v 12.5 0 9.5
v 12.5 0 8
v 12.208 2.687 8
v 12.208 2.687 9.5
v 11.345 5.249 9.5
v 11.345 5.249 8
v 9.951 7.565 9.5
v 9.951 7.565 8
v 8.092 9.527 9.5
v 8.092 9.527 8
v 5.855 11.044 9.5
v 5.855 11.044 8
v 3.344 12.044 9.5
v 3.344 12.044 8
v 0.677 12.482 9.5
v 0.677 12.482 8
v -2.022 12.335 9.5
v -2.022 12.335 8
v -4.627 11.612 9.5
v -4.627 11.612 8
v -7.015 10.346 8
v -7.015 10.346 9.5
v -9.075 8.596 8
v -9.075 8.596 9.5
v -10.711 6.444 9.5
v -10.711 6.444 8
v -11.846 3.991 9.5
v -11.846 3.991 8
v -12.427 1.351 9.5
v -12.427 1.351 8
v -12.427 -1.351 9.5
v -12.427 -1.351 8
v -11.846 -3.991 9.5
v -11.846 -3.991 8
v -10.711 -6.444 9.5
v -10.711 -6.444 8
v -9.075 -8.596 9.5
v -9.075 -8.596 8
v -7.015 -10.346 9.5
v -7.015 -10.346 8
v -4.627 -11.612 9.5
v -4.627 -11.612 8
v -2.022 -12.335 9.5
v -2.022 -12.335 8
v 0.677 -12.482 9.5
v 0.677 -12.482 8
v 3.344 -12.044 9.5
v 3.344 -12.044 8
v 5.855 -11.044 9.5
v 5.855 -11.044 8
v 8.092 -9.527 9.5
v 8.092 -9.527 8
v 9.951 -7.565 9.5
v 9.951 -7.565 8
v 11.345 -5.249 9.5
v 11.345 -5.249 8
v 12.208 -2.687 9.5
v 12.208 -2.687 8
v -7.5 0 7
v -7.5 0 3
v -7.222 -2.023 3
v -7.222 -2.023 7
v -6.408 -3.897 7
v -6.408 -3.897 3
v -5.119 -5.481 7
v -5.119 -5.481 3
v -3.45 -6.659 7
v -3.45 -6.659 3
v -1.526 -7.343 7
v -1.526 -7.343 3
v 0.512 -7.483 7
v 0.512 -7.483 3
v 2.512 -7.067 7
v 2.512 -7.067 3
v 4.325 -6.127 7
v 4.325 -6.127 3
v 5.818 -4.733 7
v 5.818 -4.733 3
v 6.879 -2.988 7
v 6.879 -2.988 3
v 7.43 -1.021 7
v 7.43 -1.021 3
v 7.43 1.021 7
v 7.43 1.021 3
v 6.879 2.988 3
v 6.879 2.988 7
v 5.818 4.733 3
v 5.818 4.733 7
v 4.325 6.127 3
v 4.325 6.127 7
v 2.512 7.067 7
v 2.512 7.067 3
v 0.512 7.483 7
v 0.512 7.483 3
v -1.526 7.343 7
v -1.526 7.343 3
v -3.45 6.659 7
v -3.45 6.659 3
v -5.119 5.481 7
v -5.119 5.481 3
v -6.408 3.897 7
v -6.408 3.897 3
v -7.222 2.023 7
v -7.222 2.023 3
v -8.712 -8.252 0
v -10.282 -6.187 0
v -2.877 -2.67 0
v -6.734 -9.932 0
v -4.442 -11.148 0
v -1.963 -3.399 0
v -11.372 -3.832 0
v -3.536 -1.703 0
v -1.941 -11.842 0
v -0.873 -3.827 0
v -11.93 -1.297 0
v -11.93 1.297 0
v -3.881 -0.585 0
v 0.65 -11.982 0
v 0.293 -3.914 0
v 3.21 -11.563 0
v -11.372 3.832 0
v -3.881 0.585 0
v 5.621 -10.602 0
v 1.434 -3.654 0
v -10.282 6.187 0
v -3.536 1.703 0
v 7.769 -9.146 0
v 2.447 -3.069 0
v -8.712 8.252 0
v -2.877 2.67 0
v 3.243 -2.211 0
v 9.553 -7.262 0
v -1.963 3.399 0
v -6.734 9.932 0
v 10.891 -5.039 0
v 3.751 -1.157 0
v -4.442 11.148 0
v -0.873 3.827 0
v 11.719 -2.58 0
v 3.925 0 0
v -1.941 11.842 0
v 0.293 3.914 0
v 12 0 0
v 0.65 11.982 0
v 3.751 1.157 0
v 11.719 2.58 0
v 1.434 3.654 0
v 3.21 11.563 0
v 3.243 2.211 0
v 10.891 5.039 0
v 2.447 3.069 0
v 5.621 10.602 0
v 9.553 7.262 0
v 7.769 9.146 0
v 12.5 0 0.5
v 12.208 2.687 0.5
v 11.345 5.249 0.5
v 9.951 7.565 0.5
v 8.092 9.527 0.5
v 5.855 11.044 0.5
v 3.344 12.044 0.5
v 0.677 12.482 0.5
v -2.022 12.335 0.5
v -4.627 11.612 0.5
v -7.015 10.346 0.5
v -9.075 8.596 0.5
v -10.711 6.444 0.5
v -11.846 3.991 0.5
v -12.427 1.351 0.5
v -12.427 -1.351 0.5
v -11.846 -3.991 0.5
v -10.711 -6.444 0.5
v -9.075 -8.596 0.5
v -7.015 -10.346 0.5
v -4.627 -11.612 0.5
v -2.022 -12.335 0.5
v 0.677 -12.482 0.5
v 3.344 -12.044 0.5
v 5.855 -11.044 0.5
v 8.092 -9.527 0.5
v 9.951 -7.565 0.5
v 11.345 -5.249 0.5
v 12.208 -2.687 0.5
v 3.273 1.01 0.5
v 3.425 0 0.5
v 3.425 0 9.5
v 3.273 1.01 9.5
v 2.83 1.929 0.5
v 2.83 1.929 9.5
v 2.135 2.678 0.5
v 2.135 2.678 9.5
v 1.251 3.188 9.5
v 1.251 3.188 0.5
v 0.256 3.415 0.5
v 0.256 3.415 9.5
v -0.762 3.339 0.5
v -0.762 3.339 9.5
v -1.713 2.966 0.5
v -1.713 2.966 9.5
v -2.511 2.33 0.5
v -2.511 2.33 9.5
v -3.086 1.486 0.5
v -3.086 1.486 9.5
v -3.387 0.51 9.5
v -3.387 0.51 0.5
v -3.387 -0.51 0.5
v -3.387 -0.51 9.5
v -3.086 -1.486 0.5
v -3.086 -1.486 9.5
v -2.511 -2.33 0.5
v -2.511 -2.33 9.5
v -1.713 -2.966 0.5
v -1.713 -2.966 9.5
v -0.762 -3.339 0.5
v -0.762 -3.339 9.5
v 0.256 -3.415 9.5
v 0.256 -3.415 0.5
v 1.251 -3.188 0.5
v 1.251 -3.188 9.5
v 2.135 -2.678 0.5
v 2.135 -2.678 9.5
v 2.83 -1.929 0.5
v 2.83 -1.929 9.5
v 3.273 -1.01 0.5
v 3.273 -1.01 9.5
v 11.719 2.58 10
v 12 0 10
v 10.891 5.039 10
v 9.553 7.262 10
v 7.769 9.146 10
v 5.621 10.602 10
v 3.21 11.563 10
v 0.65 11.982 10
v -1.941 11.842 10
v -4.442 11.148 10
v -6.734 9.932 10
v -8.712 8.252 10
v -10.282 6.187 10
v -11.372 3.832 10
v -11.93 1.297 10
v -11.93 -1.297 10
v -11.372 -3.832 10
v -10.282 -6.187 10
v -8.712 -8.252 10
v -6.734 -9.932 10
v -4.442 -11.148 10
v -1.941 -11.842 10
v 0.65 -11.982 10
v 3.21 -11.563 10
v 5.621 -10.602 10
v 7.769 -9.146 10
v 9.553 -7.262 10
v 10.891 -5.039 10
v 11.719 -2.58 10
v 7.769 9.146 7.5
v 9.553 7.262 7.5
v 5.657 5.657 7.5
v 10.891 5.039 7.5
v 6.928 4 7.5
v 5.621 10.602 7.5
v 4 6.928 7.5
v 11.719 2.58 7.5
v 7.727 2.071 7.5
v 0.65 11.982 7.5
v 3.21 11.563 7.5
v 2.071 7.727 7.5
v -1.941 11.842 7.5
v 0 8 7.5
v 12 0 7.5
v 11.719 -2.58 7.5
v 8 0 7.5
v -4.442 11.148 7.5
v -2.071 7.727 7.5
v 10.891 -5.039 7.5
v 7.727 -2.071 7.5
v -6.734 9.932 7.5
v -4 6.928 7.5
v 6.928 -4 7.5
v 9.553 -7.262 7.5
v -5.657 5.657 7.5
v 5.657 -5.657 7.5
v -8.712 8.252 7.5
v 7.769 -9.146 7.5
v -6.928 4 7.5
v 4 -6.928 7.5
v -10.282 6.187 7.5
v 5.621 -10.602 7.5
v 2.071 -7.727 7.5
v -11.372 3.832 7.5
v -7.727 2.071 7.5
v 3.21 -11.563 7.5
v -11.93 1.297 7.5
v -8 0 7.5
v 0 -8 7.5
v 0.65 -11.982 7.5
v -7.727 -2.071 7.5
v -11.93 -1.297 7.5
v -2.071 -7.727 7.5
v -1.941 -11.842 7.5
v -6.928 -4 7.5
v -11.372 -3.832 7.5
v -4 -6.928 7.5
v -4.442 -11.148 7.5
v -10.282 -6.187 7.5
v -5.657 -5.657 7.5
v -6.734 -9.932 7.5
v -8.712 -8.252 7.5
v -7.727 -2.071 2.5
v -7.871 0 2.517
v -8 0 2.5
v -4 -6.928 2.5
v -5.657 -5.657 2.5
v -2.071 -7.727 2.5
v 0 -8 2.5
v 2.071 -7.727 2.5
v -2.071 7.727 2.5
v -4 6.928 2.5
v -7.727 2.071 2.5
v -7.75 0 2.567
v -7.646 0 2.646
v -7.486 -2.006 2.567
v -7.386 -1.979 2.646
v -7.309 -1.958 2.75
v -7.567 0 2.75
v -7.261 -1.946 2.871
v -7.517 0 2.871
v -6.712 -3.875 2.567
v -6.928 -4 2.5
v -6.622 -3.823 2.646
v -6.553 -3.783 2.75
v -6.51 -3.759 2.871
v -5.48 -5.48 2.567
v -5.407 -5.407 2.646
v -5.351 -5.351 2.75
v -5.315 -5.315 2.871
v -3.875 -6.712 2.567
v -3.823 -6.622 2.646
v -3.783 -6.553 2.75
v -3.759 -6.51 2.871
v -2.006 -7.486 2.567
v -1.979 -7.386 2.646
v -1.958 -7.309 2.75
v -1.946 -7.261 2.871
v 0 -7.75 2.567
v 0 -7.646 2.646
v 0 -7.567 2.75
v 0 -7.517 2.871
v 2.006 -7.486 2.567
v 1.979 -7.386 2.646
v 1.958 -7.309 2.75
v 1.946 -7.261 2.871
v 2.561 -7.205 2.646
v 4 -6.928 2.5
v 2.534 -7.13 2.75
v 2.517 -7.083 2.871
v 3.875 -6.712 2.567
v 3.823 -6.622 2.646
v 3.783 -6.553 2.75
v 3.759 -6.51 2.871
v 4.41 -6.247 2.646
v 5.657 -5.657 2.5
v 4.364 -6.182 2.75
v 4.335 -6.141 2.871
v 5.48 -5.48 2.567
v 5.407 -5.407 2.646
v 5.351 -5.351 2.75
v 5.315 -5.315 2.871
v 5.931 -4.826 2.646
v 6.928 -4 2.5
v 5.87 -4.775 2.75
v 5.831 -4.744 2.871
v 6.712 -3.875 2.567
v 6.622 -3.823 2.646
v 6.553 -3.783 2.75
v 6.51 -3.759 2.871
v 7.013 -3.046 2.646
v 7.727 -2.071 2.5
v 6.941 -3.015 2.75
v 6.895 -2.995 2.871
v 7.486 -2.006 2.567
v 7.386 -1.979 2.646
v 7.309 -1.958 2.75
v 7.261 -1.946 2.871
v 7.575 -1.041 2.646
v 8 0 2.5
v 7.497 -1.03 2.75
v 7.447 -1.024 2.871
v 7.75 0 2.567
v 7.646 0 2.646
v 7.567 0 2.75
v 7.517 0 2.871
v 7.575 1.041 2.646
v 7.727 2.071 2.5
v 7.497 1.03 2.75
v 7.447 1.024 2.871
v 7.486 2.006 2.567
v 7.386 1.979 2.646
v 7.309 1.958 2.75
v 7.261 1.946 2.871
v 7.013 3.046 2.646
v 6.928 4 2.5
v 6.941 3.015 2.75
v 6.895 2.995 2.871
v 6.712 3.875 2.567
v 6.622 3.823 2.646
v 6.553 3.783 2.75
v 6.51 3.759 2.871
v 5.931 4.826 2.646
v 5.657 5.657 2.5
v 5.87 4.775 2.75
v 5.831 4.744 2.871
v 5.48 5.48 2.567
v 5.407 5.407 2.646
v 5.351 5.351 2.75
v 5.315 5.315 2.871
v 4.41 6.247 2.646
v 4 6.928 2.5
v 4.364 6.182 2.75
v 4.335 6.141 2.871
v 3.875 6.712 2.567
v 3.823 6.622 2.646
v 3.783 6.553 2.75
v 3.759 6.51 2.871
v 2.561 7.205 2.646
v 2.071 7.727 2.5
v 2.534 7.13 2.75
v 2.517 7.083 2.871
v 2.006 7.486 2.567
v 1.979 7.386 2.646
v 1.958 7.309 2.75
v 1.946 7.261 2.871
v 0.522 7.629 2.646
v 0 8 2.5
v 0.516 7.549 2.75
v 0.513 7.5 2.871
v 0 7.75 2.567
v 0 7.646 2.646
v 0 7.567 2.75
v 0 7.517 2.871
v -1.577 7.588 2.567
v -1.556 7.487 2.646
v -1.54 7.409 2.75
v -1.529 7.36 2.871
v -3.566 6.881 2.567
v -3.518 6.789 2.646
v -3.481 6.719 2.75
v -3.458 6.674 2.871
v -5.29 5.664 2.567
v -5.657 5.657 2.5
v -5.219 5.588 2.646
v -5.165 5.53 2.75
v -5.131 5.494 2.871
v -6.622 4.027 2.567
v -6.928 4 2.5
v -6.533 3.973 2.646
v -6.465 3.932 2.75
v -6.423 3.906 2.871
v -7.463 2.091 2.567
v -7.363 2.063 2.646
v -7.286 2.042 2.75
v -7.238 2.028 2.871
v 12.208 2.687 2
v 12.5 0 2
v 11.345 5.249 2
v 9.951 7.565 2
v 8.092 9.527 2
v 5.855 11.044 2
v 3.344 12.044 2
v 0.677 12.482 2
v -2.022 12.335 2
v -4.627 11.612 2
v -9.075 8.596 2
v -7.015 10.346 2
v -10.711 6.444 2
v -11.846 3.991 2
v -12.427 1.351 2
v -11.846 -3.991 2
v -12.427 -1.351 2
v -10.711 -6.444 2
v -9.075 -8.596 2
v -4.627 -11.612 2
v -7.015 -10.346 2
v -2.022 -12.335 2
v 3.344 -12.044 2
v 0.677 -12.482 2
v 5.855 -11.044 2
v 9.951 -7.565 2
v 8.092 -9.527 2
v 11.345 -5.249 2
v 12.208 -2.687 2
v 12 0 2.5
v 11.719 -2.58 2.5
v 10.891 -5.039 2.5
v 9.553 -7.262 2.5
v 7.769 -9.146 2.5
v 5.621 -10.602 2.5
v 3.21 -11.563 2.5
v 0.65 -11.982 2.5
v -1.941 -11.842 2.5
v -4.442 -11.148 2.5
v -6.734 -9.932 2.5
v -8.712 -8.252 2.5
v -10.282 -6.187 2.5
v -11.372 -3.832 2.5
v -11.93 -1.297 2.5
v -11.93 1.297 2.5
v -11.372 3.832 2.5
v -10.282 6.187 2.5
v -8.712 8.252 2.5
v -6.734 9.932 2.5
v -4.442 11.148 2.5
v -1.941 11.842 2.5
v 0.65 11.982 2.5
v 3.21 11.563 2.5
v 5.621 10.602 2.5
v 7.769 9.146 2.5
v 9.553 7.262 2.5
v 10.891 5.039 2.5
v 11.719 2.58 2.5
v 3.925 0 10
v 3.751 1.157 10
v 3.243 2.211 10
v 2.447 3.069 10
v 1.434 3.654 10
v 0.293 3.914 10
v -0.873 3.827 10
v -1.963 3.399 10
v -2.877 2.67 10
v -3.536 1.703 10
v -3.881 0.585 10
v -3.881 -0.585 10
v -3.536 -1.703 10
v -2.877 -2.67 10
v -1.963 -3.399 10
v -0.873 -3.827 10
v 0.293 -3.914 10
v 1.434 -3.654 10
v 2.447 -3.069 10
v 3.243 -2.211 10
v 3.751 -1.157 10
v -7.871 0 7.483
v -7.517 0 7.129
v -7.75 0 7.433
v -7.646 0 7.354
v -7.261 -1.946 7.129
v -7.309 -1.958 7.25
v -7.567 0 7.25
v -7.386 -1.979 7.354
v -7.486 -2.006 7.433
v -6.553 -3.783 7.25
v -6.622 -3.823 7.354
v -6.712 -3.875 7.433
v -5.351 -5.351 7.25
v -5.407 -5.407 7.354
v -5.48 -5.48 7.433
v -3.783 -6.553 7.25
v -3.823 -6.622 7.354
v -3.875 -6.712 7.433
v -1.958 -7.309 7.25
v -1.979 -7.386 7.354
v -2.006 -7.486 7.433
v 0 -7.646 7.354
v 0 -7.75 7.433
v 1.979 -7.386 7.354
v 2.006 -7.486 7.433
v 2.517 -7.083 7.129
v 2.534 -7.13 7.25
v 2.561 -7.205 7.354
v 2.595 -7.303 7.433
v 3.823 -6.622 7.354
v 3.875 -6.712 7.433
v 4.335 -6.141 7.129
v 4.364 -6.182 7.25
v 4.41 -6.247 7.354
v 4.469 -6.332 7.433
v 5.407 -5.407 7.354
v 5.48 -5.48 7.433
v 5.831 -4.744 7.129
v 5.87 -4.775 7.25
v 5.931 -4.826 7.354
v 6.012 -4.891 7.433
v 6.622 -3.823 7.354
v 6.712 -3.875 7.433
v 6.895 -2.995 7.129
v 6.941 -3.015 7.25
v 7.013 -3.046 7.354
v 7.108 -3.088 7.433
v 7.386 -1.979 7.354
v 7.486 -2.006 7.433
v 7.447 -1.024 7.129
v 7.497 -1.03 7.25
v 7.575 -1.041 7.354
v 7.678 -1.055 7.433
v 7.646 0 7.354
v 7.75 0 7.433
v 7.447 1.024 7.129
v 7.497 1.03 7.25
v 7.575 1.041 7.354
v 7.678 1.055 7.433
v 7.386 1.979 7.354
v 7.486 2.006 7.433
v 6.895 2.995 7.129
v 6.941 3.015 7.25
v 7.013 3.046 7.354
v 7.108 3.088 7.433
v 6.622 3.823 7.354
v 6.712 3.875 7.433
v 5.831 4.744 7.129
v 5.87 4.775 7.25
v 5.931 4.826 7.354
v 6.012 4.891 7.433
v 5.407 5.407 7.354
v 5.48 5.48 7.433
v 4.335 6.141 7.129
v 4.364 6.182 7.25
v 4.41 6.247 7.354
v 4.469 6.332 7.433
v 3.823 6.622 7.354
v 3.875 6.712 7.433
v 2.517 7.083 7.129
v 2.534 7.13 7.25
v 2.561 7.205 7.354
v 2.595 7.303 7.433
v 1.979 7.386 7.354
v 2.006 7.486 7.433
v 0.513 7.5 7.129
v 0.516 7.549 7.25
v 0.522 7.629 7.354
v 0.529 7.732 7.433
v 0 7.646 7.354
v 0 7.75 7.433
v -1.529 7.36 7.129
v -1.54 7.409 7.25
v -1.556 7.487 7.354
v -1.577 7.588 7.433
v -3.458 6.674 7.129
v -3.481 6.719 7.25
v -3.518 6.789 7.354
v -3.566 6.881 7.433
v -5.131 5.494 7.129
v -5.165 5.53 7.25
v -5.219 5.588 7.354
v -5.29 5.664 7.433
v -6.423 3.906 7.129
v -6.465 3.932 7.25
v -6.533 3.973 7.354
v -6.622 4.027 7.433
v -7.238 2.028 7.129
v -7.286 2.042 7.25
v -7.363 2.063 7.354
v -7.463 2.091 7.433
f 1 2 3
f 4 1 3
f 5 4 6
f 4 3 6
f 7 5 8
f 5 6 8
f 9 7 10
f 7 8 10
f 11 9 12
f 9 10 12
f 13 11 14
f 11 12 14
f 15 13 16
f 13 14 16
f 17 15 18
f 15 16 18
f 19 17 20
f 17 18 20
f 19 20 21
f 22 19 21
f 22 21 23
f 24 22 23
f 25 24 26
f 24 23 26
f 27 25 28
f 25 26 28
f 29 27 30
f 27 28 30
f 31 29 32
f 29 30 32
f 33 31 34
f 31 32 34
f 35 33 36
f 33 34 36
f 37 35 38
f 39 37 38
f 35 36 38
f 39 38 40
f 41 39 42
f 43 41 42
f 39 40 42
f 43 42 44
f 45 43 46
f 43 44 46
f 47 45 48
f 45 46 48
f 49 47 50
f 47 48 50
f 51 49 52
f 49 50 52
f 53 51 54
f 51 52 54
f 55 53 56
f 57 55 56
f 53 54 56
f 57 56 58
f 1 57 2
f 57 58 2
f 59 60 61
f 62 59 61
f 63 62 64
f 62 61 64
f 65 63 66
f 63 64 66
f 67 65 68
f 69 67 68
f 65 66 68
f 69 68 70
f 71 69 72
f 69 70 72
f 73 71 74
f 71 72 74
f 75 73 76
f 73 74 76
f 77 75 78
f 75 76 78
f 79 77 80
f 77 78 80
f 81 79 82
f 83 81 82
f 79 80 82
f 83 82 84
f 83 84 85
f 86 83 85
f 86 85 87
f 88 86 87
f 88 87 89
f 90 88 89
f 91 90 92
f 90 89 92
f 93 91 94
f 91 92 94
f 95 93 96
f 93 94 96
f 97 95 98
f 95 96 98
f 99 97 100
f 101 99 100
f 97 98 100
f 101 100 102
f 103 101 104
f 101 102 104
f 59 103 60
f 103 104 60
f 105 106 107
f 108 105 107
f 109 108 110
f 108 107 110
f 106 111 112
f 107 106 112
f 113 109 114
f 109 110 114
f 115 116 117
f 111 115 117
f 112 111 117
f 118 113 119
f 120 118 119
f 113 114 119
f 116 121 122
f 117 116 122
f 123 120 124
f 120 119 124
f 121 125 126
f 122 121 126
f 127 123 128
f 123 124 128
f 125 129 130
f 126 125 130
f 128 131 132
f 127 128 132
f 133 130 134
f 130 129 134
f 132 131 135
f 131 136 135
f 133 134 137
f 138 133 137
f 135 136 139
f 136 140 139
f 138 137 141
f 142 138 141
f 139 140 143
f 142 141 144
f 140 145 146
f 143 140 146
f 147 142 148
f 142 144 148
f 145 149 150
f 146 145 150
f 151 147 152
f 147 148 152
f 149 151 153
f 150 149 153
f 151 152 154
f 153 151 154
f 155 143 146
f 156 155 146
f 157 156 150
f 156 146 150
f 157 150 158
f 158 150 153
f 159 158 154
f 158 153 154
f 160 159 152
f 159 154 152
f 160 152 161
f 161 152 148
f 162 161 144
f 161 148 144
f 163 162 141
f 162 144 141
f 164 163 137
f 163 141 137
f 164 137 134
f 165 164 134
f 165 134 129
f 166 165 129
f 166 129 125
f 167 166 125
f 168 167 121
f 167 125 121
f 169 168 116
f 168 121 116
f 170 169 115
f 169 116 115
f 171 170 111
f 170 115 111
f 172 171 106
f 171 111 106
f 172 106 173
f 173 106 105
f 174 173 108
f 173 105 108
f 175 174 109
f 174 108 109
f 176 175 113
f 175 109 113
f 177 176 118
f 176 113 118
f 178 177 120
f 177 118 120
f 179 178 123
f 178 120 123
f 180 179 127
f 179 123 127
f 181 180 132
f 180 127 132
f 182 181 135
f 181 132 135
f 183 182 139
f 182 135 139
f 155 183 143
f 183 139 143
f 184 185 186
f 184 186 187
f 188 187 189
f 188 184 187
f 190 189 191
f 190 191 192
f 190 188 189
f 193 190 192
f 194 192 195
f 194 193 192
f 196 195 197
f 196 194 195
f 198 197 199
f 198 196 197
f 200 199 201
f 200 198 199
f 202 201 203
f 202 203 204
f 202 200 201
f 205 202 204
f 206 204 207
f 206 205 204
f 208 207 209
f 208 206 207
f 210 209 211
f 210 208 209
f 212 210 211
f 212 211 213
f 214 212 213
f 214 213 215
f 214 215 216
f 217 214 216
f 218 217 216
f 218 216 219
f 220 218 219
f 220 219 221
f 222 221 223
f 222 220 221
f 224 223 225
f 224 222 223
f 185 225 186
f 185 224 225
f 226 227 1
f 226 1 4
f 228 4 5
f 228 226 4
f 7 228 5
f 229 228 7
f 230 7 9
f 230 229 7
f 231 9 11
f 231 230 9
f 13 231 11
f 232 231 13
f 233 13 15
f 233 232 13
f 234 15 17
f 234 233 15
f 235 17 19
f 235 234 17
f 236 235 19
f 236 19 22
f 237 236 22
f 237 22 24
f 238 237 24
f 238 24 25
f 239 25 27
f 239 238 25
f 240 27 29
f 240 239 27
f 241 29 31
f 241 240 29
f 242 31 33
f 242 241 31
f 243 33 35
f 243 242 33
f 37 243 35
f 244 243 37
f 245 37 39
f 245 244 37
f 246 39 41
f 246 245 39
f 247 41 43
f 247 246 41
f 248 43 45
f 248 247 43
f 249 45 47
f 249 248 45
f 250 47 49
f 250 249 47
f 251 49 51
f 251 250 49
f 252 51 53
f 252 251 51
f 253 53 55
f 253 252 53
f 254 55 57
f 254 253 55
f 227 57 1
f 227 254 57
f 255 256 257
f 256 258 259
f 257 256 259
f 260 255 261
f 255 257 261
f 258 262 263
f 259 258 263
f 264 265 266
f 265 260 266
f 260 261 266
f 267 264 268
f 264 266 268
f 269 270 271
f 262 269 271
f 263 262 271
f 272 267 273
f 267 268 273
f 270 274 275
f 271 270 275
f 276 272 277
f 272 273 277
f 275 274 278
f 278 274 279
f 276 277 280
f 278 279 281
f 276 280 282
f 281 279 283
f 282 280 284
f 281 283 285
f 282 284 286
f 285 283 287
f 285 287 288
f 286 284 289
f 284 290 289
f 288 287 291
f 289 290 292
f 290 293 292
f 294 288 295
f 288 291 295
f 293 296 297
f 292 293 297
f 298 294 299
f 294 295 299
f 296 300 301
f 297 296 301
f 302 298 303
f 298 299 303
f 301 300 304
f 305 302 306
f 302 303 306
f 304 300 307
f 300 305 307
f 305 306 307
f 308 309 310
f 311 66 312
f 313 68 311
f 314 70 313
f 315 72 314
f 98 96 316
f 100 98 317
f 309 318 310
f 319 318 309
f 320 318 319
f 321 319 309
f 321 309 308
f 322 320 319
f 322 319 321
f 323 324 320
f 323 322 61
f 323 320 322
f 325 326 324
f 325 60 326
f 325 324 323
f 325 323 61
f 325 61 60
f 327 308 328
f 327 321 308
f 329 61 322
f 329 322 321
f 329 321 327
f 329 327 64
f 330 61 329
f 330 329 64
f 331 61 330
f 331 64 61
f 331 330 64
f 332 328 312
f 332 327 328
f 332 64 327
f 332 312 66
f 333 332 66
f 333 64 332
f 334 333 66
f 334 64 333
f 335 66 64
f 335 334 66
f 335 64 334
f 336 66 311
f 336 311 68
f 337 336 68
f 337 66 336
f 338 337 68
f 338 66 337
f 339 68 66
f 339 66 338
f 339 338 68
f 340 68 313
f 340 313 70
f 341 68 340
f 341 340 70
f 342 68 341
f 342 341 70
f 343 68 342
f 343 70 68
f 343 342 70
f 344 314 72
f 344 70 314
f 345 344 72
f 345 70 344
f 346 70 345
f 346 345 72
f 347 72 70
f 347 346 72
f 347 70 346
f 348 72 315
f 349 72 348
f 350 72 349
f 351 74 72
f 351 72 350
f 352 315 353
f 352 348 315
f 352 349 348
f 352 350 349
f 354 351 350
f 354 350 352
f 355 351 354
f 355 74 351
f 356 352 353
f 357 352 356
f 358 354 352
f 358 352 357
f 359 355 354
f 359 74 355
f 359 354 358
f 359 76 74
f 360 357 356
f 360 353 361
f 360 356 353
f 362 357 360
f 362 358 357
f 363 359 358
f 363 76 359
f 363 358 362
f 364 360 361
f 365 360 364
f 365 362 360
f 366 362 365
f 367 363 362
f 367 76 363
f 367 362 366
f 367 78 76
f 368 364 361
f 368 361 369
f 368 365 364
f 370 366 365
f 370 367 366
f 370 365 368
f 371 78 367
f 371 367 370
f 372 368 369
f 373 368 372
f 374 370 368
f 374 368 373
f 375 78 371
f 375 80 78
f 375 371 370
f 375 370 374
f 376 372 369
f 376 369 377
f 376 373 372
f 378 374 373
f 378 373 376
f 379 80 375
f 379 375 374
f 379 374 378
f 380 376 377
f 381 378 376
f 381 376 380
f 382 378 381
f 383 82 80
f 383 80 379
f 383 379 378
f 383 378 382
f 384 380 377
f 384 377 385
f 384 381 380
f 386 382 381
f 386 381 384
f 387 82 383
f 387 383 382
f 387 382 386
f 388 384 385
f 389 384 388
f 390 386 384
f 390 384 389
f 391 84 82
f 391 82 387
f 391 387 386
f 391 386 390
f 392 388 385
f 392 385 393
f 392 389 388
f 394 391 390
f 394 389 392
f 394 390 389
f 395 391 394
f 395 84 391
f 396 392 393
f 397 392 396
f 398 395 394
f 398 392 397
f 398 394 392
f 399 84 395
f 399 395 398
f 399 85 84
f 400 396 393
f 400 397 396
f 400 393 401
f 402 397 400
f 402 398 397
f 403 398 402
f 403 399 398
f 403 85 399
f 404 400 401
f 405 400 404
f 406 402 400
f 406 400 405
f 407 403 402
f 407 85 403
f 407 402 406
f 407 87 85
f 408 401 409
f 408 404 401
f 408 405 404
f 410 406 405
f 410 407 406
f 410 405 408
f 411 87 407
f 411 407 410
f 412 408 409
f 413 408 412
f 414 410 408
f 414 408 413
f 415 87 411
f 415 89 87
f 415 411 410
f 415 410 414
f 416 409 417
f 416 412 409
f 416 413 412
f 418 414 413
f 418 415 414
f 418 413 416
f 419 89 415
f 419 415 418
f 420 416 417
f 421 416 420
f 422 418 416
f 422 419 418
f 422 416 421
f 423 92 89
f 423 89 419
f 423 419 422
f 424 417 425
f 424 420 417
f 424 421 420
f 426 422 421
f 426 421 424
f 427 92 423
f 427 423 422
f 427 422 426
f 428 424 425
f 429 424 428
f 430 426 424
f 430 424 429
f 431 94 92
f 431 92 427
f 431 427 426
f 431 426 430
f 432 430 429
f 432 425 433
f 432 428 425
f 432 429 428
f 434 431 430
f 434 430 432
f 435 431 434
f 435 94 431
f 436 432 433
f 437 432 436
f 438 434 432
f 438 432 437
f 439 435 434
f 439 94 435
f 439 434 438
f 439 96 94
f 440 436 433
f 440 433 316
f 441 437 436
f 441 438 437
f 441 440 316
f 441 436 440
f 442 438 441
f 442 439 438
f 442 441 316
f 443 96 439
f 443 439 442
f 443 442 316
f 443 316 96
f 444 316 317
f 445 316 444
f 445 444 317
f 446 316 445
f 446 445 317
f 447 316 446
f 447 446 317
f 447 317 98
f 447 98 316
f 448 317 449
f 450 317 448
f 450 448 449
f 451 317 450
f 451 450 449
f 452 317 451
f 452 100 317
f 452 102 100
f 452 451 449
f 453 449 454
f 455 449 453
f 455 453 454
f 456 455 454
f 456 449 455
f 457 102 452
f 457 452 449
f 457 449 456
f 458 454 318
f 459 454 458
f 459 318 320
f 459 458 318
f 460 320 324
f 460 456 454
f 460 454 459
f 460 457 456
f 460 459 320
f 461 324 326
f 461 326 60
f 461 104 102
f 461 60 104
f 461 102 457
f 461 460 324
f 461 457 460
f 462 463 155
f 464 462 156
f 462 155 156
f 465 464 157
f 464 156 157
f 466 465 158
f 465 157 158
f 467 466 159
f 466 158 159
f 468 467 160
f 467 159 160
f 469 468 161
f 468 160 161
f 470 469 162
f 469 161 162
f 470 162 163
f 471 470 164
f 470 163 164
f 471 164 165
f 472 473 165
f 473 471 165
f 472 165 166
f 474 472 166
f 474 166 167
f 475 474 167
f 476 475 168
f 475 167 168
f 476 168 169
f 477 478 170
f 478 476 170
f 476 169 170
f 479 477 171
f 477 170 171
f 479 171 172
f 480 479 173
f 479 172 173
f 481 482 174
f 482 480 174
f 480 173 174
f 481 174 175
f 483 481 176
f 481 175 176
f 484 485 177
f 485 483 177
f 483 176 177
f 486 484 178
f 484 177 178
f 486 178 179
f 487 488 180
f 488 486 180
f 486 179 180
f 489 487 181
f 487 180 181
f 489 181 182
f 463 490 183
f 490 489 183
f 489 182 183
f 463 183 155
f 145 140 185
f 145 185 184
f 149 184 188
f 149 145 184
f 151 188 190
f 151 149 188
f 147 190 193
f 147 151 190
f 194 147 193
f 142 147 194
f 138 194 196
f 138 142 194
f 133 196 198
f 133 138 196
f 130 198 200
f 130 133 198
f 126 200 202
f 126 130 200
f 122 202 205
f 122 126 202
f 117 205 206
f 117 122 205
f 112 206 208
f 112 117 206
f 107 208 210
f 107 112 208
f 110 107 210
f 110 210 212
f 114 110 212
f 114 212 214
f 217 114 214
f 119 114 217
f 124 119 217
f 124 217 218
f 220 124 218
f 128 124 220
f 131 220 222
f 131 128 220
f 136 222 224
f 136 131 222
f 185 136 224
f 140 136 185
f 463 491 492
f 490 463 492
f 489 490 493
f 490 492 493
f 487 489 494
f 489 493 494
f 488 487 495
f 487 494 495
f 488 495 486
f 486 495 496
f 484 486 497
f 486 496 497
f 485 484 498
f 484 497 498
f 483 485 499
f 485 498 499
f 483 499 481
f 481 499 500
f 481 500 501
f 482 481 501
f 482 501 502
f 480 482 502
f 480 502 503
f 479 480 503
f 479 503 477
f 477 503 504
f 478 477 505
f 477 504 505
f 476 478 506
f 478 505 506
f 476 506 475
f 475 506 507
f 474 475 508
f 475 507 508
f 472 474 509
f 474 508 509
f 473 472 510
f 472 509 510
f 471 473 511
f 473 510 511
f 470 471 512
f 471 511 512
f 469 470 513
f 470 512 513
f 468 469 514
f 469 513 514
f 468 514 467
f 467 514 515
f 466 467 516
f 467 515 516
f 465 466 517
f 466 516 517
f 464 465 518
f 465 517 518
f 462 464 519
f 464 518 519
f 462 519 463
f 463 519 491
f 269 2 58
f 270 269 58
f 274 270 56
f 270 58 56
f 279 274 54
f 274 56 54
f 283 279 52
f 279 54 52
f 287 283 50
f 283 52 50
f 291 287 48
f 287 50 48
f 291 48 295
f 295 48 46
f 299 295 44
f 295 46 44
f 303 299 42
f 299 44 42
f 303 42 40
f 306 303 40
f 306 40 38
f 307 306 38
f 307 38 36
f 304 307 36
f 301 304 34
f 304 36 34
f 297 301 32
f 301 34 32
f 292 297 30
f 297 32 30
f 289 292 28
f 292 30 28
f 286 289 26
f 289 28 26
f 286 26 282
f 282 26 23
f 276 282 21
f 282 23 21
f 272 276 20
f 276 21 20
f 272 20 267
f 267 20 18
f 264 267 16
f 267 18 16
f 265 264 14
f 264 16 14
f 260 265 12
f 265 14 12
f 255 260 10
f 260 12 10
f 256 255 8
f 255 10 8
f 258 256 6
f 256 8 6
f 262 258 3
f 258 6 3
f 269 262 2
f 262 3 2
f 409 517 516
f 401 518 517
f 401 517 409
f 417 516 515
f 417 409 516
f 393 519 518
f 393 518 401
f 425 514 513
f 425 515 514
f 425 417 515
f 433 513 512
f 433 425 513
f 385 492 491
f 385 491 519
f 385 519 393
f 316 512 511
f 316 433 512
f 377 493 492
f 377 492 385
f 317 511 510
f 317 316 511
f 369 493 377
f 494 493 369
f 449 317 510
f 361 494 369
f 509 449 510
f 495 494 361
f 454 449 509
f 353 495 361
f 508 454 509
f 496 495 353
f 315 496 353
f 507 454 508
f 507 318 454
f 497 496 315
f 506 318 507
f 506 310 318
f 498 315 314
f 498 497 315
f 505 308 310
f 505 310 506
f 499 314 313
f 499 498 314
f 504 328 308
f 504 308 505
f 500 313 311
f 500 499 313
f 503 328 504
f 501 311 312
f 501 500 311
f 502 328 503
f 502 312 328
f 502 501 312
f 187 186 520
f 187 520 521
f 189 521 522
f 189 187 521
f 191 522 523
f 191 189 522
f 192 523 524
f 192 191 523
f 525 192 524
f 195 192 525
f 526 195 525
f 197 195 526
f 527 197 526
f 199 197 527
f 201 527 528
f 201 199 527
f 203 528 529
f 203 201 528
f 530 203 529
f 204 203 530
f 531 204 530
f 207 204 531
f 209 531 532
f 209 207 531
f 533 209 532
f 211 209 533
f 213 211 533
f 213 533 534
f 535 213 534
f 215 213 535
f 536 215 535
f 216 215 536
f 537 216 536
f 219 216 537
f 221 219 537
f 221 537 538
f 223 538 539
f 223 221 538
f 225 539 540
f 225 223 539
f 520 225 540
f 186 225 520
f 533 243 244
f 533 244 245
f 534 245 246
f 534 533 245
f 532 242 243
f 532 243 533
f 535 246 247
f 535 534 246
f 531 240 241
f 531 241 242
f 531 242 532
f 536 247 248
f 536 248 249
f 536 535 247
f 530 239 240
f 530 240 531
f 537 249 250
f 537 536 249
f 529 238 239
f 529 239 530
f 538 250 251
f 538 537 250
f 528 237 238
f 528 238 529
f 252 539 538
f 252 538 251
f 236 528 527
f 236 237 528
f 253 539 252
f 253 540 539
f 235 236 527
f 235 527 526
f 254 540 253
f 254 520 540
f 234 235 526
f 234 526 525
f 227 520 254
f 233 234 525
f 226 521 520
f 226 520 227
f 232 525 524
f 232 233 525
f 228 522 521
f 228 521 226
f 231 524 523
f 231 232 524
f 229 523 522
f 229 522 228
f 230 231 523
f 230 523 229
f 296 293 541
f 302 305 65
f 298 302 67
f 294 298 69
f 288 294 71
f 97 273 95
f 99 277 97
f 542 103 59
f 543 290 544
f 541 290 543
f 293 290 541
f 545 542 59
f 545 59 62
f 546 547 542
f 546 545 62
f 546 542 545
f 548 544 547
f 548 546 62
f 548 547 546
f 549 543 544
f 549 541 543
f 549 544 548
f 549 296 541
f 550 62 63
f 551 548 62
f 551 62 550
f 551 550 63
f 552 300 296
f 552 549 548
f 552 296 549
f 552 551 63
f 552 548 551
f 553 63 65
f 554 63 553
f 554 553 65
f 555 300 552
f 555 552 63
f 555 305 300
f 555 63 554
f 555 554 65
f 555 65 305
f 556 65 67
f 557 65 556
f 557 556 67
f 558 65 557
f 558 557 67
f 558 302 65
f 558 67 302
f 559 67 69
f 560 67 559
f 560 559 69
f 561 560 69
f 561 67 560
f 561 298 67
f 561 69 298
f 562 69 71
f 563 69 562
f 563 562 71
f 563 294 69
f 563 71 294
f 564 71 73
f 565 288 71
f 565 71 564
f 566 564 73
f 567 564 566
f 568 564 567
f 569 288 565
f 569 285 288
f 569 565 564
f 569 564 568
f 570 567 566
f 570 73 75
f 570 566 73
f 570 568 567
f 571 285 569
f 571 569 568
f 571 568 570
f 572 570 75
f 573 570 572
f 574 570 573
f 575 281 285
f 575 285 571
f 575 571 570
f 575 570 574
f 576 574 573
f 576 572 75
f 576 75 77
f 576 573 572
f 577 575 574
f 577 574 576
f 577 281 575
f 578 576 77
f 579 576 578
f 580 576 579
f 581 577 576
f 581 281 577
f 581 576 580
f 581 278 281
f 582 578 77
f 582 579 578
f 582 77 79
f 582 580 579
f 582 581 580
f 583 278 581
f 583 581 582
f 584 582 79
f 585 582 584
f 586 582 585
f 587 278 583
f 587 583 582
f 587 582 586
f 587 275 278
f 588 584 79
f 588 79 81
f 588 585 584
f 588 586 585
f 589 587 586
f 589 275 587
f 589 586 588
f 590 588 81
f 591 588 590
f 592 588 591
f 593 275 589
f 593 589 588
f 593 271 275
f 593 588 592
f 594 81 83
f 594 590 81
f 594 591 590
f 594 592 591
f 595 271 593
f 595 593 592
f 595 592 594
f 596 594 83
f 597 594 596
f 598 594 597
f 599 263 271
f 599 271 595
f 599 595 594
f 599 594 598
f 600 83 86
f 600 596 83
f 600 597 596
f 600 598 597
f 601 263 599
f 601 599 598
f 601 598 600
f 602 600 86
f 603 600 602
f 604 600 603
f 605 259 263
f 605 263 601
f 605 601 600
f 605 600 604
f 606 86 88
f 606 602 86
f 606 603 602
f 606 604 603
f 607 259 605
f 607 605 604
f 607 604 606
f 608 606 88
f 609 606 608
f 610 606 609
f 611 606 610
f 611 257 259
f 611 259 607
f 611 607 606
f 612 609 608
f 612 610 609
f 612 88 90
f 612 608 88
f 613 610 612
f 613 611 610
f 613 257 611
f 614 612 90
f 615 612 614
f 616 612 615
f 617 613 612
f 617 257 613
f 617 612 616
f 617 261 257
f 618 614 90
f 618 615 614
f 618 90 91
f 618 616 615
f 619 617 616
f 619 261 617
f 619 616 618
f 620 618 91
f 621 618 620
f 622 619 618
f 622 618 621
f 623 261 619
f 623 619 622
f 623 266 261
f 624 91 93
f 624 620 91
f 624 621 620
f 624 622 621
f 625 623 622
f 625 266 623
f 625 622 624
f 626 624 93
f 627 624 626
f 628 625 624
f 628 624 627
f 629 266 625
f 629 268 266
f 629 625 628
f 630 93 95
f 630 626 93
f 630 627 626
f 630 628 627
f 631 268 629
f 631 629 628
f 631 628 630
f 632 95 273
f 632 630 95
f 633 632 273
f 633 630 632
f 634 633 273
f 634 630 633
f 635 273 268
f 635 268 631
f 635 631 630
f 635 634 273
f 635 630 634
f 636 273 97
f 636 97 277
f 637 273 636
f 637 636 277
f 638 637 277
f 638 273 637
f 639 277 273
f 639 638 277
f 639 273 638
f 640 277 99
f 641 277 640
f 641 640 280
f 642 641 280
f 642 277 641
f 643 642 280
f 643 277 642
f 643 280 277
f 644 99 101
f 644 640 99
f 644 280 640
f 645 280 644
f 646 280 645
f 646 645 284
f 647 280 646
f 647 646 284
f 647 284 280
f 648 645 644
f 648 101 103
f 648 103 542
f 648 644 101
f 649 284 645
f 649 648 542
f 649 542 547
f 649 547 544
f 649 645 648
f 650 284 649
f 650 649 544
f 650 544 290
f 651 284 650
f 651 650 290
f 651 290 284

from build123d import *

# Parameters (mm, degrees)
SKETCH1_R           = 12.5
SKETCH1_R_2         = 3.425
BOSS_EXTRUDE1_DEPTH = 10
SKETCH2_W           = 5
SKETCH2_H           = 5
CHAMFER1_SIZE       = 0.5
FILLET1_R           = 0.5


with BuildPart() as part:
    # Sketch1 → Boss-Extrude1 (new body)
    with BuildSketch(Plane.XY):
        Circle(SKETCH1_R)
        Circle(SKETCH1_R_2, mode=Mode.SUBTRACT)
    extrude(amount=BOSS_EXTRUDE1_DEPTH)

    # Sketch2 → Cut-Revolve1 (revolve, cut)
    with BuildSketch(Plane(origin=(0, 0, 0), x_dir=(1, 0, 0), z_dir=(0, 1, 0))):
        with Locations((-10, -5)):
            Rectangle(SKETCH2_W, SKETCH2_H)
    revolve(axis=Axis((0, 0, 0), (0, 0, 1)), mode=Mode.SUBTRACT)

    # Chamfer1
    chamfer1_edges = [part.edges().sort_by_distance(p)[0] for p in [
        (-12.5, 0, 2.5),
        (-12.5, 0, 7.5),
        (-12.5, 0, 10),
        (-12.5, 0, 0),
        (-3.425, 0, 0),
        (-3.425, 0, 10),
    ]]
    chamfer(chamfer1_edges, length=CHAMFER1_SIZE)

    # Fillet1
    fillet1_edges = [part.edges().sort_by_distance(p)[0] for p in [
        (7.5, 0, 7.5),
        (7.5, 0, 2.5),
    ]]
    fillet(fillet1_edges, radius=FILLET1_R)


solid = part.part
